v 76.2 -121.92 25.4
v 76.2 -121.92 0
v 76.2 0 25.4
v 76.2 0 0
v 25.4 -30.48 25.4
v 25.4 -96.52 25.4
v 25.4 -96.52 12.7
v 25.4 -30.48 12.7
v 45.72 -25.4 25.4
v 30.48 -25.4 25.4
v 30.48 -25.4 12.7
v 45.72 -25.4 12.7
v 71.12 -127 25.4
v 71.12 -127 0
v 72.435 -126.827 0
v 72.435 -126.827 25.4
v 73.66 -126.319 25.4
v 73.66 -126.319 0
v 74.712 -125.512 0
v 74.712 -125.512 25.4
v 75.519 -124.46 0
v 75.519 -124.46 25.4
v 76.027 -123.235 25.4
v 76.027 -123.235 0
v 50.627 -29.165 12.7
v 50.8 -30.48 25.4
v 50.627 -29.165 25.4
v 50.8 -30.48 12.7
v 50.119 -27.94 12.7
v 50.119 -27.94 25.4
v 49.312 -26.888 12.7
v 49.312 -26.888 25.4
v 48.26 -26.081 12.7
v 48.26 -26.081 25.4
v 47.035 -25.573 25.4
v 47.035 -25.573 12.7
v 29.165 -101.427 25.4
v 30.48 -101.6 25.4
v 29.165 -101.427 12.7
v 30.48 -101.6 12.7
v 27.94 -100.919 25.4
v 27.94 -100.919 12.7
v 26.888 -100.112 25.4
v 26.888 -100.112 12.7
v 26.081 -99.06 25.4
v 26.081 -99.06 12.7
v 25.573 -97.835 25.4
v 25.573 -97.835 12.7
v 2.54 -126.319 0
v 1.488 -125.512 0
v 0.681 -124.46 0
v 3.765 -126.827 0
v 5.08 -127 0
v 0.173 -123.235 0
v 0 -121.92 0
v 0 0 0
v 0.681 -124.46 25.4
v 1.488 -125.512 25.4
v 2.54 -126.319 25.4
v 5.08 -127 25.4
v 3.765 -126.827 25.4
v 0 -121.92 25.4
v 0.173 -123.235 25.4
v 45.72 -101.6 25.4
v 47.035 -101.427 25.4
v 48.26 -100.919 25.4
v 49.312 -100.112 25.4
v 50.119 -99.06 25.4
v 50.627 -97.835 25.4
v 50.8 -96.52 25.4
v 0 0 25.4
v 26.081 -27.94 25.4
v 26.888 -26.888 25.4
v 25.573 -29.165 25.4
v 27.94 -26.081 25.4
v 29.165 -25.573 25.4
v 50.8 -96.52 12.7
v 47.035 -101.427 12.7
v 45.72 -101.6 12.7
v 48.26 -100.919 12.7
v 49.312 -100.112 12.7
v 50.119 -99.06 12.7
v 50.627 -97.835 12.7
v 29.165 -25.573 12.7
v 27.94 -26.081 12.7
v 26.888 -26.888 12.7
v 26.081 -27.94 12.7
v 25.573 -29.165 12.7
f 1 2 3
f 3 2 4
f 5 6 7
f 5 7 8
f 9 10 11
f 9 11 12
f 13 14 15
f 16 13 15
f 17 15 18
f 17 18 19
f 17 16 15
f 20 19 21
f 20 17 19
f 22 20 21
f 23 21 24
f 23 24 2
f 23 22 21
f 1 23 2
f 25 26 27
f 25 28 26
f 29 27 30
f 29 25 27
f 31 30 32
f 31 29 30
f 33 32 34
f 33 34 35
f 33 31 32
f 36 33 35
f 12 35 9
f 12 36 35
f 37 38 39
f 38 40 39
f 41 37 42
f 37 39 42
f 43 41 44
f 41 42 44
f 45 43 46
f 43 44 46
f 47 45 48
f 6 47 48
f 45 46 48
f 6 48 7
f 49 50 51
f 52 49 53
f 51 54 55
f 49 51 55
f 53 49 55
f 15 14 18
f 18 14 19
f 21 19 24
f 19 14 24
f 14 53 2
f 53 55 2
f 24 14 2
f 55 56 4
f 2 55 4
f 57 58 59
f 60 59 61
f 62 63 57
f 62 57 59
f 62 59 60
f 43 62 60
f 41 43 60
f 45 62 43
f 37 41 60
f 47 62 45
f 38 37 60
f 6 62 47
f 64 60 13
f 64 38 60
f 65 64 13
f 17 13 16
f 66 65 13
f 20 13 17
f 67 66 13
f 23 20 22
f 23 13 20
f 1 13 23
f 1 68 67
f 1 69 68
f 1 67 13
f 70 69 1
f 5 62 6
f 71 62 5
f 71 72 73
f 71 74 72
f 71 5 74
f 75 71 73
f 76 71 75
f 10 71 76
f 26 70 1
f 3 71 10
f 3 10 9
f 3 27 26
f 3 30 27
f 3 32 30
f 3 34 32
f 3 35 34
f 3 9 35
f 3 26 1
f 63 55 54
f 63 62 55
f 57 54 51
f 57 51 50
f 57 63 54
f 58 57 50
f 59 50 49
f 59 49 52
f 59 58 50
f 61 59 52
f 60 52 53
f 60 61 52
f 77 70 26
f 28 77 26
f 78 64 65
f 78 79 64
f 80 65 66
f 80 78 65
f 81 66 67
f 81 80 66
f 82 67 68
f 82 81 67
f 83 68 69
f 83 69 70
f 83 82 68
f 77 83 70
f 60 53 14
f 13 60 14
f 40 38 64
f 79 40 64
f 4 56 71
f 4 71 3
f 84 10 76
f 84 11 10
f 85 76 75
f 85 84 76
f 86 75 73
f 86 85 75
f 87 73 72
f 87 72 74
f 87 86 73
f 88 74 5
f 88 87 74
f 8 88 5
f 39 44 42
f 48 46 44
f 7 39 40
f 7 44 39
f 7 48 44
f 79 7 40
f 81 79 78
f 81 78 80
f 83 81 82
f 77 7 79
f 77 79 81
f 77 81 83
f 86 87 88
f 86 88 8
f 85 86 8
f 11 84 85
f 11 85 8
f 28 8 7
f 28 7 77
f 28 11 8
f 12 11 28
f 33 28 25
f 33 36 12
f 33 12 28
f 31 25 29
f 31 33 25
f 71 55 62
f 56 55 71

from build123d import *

# Parameters (mm, degrees)
F0_W     = 76.2
F0_H     = 127
F1_DEPTH = 25.4
F2_R     = 5.08
F3_W     = 25.4
F3_H     = 76.2
F4_DEPTH = 12.7
F5_R     = 5.08


with BuildPart() as f1:
    # F0 (on Top) → F1 (new body)
    with BuildSketch(Plane.XY):
        with Locations((38.1, -63.5)):
            Rectangle(F0_W, F0_H)
    extrude(amount=F1_DEPTH)

    # F2
    f2_edges = [f1.edges().sort_by_distance(p)[0] for p in [
        (0, -127, 12.7),
        (76.2, -127, 12.7),
    ]]
    fillet(f2_edges, radius=F2_R)

    # F3 (on face) → F4 (cut)
    with BuildSketch(Plane.XY.offset(25.4)):
        with Locations((38.1, -63.5)):
            Rectangle(F3_W, F3_H)
    extrude(amount=-F4_DEPTH, mode=Mode.SUBTRACT)

    # F5
    f5_edges = [f1.edges().sort_by_distance(p)[0] for p in [
        (50.8, -25.4, 19.05),
        (25.4, -25.4, 19.05),
        (50.8, -101.6, 19.05),
        (25.4, -101.6, 19.05),
    ]]
    fillet(f5_edges, radius=F5_R)


solid = f1.part
